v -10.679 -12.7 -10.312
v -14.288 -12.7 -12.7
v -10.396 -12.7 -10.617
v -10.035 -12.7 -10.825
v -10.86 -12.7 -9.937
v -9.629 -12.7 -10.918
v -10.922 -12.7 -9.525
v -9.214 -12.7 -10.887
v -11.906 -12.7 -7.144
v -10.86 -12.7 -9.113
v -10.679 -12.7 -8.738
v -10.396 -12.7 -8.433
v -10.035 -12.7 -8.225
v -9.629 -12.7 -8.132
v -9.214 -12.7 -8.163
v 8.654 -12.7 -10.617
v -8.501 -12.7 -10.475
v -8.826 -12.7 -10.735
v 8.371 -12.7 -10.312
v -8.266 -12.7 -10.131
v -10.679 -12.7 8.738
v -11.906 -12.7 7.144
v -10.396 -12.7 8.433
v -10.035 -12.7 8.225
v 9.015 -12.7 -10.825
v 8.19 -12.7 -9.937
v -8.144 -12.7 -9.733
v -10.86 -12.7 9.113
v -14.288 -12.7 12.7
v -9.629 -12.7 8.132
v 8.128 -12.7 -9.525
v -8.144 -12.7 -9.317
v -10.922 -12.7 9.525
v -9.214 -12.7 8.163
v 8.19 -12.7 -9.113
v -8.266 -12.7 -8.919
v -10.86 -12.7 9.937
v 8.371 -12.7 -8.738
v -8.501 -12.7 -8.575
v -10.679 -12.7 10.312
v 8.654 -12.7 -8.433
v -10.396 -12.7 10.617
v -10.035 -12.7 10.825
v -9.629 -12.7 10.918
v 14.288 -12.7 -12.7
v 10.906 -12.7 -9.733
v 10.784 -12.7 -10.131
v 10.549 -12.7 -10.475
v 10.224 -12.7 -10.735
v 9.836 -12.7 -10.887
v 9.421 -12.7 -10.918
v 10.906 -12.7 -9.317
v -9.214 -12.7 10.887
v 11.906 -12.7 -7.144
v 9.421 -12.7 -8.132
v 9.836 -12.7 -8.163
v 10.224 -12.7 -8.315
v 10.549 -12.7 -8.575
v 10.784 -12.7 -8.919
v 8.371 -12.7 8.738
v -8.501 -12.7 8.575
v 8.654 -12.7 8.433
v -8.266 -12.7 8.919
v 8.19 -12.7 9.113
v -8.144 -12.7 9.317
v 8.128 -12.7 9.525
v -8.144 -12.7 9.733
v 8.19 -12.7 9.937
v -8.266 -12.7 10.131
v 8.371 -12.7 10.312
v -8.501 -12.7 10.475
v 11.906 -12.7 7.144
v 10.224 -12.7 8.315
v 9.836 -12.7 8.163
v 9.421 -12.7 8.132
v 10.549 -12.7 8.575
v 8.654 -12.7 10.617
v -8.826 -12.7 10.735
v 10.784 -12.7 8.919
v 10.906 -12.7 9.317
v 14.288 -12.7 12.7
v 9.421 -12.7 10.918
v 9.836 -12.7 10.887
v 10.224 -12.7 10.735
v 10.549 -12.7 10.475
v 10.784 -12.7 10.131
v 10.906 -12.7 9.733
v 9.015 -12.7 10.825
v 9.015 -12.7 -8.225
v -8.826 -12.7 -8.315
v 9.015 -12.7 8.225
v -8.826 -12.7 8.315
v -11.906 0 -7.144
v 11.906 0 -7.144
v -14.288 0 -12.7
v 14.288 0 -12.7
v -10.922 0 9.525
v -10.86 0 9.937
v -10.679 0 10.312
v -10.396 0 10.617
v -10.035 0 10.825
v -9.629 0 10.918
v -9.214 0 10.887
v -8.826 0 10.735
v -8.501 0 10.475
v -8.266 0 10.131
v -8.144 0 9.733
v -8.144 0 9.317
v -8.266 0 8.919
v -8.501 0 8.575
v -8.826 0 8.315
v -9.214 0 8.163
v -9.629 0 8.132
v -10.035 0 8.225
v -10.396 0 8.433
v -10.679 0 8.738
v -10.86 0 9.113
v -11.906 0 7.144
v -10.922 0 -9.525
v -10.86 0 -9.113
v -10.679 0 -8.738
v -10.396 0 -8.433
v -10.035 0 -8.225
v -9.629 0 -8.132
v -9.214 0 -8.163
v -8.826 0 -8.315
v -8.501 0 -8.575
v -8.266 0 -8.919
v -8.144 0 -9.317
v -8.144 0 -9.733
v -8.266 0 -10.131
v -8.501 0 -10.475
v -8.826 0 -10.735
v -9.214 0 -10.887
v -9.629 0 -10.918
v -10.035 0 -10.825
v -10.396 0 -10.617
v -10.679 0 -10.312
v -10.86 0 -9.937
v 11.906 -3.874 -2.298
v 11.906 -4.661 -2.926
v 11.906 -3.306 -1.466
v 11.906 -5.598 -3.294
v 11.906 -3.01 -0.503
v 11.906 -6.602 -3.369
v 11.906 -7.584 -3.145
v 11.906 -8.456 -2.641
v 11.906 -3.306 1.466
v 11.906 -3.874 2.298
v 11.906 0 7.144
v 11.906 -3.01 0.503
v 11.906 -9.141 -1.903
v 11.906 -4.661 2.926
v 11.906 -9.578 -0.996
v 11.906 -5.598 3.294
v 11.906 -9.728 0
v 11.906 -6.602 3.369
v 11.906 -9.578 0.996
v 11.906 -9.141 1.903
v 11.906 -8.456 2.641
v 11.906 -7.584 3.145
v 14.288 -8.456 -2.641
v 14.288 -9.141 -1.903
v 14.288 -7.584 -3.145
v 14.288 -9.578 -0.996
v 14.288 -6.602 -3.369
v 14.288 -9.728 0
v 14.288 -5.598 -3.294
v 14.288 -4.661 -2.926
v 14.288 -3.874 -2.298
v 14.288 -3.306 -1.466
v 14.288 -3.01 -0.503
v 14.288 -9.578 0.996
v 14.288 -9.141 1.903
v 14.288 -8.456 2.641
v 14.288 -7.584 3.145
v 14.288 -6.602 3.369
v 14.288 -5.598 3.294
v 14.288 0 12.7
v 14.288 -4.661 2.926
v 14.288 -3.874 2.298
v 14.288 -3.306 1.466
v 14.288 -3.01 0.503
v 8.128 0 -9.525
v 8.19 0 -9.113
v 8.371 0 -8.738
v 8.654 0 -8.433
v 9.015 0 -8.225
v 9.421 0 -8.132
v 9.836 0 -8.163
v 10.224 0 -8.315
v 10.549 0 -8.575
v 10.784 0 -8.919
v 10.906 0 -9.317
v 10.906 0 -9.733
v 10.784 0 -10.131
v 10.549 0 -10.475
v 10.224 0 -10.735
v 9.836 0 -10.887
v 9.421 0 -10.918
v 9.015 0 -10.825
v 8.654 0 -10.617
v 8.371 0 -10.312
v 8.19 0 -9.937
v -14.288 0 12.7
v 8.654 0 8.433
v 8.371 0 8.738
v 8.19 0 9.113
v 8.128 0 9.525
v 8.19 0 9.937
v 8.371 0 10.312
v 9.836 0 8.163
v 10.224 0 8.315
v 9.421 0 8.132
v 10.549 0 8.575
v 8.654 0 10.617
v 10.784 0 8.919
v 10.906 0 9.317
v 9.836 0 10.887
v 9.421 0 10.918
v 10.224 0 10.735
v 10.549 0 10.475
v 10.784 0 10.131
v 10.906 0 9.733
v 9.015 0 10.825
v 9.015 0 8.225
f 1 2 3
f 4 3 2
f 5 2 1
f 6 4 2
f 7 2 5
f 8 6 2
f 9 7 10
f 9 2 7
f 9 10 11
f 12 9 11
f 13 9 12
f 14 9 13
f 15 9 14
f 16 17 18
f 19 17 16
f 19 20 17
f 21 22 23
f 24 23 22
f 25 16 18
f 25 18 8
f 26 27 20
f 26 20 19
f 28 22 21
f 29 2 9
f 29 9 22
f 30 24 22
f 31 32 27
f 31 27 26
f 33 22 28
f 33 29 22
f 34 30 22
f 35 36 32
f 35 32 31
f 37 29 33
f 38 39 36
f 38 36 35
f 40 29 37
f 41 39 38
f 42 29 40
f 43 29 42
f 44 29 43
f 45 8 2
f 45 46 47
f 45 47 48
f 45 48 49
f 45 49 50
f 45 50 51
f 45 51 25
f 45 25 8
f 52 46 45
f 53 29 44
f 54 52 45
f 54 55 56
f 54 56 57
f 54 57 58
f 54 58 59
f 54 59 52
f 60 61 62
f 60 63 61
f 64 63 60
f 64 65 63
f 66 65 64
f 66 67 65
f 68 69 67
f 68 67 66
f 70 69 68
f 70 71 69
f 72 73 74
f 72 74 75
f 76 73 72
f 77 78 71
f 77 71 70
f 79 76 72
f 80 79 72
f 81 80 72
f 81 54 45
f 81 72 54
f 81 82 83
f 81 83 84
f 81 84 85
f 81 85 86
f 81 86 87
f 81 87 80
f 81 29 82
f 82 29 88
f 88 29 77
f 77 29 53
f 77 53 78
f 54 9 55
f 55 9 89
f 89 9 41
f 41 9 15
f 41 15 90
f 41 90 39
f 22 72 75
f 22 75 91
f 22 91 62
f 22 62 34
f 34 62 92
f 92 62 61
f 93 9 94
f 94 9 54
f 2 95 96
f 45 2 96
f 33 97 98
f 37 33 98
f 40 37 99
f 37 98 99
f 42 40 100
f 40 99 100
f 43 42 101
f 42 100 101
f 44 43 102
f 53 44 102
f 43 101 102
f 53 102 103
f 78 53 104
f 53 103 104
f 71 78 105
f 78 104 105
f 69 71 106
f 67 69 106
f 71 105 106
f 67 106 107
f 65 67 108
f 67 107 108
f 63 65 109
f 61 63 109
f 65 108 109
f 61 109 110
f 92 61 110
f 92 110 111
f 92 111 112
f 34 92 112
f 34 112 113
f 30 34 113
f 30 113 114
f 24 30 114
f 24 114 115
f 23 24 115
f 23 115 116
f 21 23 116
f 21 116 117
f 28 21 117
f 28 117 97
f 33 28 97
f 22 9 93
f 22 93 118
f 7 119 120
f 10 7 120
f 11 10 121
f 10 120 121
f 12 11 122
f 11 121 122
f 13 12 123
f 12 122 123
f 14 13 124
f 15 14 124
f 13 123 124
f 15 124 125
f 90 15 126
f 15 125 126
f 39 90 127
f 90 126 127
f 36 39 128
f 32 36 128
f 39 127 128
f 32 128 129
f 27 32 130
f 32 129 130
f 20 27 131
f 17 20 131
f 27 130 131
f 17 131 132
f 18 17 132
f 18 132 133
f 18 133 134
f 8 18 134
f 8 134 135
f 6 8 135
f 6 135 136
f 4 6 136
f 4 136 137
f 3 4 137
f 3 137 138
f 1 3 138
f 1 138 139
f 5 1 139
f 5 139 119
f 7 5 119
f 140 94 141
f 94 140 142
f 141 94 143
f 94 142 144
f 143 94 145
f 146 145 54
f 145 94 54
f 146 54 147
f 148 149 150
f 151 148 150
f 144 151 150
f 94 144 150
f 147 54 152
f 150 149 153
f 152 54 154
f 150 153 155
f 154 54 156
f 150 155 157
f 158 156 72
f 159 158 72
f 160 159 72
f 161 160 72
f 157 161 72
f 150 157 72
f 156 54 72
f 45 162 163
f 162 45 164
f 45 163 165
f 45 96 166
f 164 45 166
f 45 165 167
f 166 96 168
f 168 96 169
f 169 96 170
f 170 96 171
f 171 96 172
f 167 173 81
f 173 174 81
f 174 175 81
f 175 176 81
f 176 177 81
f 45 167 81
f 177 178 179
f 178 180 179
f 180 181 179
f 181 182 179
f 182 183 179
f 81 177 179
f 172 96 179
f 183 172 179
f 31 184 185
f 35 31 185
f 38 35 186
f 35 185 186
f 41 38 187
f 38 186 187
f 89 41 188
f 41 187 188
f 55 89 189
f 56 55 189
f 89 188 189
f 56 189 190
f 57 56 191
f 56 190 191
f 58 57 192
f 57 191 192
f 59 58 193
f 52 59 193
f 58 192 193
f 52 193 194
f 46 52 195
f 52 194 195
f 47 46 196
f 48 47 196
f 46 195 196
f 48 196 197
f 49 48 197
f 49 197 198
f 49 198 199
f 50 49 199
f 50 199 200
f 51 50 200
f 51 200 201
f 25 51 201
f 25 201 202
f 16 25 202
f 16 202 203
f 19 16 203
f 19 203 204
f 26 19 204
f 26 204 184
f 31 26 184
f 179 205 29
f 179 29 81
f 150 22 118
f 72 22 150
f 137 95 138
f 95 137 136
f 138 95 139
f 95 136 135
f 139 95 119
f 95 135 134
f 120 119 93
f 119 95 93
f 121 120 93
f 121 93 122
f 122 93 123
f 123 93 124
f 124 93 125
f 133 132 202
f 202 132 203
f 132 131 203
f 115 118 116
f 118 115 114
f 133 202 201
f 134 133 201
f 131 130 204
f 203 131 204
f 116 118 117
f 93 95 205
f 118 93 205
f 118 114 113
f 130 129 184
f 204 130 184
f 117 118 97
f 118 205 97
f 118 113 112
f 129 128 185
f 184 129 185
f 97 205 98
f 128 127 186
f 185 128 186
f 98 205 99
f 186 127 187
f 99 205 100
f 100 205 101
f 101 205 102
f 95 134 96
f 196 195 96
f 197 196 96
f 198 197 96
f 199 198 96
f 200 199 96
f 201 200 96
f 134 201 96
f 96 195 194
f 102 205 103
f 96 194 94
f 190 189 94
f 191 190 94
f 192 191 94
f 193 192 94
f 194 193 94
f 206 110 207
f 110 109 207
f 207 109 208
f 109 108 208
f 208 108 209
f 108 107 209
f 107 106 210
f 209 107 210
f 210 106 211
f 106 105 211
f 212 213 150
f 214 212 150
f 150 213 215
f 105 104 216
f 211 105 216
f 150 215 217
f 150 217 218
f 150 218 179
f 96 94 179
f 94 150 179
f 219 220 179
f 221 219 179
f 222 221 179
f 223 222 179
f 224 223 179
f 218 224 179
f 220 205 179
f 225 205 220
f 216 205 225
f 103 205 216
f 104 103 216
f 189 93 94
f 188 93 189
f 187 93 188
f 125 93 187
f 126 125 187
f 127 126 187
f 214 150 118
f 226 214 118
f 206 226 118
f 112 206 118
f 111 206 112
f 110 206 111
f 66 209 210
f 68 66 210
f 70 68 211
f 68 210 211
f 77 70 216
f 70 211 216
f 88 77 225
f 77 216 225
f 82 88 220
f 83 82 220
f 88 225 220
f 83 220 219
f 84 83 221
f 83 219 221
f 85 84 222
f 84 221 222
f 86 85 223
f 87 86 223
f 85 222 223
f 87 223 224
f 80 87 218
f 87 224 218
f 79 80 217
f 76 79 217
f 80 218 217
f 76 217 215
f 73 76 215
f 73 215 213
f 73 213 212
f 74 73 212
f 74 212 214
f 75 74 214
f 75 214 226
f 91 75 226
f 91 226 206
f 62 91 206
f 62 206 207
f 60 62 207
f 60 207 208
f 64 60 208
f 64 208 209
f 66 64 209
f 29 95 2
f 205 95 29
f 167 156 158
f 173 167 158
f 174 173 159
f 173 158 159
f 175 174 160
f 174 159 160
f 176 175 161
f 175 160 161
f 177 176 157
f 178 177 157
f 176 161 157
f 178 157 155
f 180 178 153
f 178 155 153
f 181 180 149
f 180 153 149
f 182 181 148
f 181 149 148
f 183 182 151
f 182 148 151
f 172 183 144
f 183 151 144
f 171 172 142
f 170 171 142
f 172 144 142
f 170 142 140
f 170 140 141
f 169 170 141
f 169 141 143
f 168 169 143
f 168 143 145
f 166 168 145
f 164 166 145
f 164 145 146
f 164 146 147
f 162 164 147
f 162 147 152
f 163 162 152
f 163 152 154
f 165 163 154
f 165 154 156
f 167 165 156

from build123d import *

# Parameters (mm, degrees)
F0_W     = 28.575
F0_H     = 25.4
F1_DEPTH = 12.7
F2_W     = 23.8125
F2_H     = 14.2875
F3_DEPTH = 12.701
F5_D     = 6.7564
F5_DEPTH = 3.96875
F5_TIP   = 2.0298273432
F7_D     = 2.794


with BuildPart() as f1:
    # F0 (on Front) → F1 (new body)
    with BuildSketch(Plane.XZ):
        Rectangle(F0_W, F0_H)
    extrude(amount=F1_DEPTH)

    # F2 (on face) → F3 (cut, through all)
    with BuildSketch(Plane.XZ.offset(12.7)):
        Rectangle(F2_W, F2_H)
    extrude(amount=-F3_DEPTH, mode=Mode.SUBTRACT)

    # F5
    with Locations(Plane.YZ.offset(14.2875)):
        with Locations((-6.35, 0)):
            Hole(F5_D / 2, depth=F5_DEPTH)
            with Locations((0, 0, -(F5_DEPTH + F5_TIP / 2))):  # 118° drill point
                Cone(0, F5_D / 2, F5_TIP, mode=Mode.SUBTRACT)

    # F7 (through all)
    with Locations(Plane.XZ.offset(12.7)):
        with Locations((-9.525, 9.525), (9.525, 9.525), (9.525, -9.525), (-9.525, -9.525)):
            Hole(F7_D / 2)


solid = f1.part
